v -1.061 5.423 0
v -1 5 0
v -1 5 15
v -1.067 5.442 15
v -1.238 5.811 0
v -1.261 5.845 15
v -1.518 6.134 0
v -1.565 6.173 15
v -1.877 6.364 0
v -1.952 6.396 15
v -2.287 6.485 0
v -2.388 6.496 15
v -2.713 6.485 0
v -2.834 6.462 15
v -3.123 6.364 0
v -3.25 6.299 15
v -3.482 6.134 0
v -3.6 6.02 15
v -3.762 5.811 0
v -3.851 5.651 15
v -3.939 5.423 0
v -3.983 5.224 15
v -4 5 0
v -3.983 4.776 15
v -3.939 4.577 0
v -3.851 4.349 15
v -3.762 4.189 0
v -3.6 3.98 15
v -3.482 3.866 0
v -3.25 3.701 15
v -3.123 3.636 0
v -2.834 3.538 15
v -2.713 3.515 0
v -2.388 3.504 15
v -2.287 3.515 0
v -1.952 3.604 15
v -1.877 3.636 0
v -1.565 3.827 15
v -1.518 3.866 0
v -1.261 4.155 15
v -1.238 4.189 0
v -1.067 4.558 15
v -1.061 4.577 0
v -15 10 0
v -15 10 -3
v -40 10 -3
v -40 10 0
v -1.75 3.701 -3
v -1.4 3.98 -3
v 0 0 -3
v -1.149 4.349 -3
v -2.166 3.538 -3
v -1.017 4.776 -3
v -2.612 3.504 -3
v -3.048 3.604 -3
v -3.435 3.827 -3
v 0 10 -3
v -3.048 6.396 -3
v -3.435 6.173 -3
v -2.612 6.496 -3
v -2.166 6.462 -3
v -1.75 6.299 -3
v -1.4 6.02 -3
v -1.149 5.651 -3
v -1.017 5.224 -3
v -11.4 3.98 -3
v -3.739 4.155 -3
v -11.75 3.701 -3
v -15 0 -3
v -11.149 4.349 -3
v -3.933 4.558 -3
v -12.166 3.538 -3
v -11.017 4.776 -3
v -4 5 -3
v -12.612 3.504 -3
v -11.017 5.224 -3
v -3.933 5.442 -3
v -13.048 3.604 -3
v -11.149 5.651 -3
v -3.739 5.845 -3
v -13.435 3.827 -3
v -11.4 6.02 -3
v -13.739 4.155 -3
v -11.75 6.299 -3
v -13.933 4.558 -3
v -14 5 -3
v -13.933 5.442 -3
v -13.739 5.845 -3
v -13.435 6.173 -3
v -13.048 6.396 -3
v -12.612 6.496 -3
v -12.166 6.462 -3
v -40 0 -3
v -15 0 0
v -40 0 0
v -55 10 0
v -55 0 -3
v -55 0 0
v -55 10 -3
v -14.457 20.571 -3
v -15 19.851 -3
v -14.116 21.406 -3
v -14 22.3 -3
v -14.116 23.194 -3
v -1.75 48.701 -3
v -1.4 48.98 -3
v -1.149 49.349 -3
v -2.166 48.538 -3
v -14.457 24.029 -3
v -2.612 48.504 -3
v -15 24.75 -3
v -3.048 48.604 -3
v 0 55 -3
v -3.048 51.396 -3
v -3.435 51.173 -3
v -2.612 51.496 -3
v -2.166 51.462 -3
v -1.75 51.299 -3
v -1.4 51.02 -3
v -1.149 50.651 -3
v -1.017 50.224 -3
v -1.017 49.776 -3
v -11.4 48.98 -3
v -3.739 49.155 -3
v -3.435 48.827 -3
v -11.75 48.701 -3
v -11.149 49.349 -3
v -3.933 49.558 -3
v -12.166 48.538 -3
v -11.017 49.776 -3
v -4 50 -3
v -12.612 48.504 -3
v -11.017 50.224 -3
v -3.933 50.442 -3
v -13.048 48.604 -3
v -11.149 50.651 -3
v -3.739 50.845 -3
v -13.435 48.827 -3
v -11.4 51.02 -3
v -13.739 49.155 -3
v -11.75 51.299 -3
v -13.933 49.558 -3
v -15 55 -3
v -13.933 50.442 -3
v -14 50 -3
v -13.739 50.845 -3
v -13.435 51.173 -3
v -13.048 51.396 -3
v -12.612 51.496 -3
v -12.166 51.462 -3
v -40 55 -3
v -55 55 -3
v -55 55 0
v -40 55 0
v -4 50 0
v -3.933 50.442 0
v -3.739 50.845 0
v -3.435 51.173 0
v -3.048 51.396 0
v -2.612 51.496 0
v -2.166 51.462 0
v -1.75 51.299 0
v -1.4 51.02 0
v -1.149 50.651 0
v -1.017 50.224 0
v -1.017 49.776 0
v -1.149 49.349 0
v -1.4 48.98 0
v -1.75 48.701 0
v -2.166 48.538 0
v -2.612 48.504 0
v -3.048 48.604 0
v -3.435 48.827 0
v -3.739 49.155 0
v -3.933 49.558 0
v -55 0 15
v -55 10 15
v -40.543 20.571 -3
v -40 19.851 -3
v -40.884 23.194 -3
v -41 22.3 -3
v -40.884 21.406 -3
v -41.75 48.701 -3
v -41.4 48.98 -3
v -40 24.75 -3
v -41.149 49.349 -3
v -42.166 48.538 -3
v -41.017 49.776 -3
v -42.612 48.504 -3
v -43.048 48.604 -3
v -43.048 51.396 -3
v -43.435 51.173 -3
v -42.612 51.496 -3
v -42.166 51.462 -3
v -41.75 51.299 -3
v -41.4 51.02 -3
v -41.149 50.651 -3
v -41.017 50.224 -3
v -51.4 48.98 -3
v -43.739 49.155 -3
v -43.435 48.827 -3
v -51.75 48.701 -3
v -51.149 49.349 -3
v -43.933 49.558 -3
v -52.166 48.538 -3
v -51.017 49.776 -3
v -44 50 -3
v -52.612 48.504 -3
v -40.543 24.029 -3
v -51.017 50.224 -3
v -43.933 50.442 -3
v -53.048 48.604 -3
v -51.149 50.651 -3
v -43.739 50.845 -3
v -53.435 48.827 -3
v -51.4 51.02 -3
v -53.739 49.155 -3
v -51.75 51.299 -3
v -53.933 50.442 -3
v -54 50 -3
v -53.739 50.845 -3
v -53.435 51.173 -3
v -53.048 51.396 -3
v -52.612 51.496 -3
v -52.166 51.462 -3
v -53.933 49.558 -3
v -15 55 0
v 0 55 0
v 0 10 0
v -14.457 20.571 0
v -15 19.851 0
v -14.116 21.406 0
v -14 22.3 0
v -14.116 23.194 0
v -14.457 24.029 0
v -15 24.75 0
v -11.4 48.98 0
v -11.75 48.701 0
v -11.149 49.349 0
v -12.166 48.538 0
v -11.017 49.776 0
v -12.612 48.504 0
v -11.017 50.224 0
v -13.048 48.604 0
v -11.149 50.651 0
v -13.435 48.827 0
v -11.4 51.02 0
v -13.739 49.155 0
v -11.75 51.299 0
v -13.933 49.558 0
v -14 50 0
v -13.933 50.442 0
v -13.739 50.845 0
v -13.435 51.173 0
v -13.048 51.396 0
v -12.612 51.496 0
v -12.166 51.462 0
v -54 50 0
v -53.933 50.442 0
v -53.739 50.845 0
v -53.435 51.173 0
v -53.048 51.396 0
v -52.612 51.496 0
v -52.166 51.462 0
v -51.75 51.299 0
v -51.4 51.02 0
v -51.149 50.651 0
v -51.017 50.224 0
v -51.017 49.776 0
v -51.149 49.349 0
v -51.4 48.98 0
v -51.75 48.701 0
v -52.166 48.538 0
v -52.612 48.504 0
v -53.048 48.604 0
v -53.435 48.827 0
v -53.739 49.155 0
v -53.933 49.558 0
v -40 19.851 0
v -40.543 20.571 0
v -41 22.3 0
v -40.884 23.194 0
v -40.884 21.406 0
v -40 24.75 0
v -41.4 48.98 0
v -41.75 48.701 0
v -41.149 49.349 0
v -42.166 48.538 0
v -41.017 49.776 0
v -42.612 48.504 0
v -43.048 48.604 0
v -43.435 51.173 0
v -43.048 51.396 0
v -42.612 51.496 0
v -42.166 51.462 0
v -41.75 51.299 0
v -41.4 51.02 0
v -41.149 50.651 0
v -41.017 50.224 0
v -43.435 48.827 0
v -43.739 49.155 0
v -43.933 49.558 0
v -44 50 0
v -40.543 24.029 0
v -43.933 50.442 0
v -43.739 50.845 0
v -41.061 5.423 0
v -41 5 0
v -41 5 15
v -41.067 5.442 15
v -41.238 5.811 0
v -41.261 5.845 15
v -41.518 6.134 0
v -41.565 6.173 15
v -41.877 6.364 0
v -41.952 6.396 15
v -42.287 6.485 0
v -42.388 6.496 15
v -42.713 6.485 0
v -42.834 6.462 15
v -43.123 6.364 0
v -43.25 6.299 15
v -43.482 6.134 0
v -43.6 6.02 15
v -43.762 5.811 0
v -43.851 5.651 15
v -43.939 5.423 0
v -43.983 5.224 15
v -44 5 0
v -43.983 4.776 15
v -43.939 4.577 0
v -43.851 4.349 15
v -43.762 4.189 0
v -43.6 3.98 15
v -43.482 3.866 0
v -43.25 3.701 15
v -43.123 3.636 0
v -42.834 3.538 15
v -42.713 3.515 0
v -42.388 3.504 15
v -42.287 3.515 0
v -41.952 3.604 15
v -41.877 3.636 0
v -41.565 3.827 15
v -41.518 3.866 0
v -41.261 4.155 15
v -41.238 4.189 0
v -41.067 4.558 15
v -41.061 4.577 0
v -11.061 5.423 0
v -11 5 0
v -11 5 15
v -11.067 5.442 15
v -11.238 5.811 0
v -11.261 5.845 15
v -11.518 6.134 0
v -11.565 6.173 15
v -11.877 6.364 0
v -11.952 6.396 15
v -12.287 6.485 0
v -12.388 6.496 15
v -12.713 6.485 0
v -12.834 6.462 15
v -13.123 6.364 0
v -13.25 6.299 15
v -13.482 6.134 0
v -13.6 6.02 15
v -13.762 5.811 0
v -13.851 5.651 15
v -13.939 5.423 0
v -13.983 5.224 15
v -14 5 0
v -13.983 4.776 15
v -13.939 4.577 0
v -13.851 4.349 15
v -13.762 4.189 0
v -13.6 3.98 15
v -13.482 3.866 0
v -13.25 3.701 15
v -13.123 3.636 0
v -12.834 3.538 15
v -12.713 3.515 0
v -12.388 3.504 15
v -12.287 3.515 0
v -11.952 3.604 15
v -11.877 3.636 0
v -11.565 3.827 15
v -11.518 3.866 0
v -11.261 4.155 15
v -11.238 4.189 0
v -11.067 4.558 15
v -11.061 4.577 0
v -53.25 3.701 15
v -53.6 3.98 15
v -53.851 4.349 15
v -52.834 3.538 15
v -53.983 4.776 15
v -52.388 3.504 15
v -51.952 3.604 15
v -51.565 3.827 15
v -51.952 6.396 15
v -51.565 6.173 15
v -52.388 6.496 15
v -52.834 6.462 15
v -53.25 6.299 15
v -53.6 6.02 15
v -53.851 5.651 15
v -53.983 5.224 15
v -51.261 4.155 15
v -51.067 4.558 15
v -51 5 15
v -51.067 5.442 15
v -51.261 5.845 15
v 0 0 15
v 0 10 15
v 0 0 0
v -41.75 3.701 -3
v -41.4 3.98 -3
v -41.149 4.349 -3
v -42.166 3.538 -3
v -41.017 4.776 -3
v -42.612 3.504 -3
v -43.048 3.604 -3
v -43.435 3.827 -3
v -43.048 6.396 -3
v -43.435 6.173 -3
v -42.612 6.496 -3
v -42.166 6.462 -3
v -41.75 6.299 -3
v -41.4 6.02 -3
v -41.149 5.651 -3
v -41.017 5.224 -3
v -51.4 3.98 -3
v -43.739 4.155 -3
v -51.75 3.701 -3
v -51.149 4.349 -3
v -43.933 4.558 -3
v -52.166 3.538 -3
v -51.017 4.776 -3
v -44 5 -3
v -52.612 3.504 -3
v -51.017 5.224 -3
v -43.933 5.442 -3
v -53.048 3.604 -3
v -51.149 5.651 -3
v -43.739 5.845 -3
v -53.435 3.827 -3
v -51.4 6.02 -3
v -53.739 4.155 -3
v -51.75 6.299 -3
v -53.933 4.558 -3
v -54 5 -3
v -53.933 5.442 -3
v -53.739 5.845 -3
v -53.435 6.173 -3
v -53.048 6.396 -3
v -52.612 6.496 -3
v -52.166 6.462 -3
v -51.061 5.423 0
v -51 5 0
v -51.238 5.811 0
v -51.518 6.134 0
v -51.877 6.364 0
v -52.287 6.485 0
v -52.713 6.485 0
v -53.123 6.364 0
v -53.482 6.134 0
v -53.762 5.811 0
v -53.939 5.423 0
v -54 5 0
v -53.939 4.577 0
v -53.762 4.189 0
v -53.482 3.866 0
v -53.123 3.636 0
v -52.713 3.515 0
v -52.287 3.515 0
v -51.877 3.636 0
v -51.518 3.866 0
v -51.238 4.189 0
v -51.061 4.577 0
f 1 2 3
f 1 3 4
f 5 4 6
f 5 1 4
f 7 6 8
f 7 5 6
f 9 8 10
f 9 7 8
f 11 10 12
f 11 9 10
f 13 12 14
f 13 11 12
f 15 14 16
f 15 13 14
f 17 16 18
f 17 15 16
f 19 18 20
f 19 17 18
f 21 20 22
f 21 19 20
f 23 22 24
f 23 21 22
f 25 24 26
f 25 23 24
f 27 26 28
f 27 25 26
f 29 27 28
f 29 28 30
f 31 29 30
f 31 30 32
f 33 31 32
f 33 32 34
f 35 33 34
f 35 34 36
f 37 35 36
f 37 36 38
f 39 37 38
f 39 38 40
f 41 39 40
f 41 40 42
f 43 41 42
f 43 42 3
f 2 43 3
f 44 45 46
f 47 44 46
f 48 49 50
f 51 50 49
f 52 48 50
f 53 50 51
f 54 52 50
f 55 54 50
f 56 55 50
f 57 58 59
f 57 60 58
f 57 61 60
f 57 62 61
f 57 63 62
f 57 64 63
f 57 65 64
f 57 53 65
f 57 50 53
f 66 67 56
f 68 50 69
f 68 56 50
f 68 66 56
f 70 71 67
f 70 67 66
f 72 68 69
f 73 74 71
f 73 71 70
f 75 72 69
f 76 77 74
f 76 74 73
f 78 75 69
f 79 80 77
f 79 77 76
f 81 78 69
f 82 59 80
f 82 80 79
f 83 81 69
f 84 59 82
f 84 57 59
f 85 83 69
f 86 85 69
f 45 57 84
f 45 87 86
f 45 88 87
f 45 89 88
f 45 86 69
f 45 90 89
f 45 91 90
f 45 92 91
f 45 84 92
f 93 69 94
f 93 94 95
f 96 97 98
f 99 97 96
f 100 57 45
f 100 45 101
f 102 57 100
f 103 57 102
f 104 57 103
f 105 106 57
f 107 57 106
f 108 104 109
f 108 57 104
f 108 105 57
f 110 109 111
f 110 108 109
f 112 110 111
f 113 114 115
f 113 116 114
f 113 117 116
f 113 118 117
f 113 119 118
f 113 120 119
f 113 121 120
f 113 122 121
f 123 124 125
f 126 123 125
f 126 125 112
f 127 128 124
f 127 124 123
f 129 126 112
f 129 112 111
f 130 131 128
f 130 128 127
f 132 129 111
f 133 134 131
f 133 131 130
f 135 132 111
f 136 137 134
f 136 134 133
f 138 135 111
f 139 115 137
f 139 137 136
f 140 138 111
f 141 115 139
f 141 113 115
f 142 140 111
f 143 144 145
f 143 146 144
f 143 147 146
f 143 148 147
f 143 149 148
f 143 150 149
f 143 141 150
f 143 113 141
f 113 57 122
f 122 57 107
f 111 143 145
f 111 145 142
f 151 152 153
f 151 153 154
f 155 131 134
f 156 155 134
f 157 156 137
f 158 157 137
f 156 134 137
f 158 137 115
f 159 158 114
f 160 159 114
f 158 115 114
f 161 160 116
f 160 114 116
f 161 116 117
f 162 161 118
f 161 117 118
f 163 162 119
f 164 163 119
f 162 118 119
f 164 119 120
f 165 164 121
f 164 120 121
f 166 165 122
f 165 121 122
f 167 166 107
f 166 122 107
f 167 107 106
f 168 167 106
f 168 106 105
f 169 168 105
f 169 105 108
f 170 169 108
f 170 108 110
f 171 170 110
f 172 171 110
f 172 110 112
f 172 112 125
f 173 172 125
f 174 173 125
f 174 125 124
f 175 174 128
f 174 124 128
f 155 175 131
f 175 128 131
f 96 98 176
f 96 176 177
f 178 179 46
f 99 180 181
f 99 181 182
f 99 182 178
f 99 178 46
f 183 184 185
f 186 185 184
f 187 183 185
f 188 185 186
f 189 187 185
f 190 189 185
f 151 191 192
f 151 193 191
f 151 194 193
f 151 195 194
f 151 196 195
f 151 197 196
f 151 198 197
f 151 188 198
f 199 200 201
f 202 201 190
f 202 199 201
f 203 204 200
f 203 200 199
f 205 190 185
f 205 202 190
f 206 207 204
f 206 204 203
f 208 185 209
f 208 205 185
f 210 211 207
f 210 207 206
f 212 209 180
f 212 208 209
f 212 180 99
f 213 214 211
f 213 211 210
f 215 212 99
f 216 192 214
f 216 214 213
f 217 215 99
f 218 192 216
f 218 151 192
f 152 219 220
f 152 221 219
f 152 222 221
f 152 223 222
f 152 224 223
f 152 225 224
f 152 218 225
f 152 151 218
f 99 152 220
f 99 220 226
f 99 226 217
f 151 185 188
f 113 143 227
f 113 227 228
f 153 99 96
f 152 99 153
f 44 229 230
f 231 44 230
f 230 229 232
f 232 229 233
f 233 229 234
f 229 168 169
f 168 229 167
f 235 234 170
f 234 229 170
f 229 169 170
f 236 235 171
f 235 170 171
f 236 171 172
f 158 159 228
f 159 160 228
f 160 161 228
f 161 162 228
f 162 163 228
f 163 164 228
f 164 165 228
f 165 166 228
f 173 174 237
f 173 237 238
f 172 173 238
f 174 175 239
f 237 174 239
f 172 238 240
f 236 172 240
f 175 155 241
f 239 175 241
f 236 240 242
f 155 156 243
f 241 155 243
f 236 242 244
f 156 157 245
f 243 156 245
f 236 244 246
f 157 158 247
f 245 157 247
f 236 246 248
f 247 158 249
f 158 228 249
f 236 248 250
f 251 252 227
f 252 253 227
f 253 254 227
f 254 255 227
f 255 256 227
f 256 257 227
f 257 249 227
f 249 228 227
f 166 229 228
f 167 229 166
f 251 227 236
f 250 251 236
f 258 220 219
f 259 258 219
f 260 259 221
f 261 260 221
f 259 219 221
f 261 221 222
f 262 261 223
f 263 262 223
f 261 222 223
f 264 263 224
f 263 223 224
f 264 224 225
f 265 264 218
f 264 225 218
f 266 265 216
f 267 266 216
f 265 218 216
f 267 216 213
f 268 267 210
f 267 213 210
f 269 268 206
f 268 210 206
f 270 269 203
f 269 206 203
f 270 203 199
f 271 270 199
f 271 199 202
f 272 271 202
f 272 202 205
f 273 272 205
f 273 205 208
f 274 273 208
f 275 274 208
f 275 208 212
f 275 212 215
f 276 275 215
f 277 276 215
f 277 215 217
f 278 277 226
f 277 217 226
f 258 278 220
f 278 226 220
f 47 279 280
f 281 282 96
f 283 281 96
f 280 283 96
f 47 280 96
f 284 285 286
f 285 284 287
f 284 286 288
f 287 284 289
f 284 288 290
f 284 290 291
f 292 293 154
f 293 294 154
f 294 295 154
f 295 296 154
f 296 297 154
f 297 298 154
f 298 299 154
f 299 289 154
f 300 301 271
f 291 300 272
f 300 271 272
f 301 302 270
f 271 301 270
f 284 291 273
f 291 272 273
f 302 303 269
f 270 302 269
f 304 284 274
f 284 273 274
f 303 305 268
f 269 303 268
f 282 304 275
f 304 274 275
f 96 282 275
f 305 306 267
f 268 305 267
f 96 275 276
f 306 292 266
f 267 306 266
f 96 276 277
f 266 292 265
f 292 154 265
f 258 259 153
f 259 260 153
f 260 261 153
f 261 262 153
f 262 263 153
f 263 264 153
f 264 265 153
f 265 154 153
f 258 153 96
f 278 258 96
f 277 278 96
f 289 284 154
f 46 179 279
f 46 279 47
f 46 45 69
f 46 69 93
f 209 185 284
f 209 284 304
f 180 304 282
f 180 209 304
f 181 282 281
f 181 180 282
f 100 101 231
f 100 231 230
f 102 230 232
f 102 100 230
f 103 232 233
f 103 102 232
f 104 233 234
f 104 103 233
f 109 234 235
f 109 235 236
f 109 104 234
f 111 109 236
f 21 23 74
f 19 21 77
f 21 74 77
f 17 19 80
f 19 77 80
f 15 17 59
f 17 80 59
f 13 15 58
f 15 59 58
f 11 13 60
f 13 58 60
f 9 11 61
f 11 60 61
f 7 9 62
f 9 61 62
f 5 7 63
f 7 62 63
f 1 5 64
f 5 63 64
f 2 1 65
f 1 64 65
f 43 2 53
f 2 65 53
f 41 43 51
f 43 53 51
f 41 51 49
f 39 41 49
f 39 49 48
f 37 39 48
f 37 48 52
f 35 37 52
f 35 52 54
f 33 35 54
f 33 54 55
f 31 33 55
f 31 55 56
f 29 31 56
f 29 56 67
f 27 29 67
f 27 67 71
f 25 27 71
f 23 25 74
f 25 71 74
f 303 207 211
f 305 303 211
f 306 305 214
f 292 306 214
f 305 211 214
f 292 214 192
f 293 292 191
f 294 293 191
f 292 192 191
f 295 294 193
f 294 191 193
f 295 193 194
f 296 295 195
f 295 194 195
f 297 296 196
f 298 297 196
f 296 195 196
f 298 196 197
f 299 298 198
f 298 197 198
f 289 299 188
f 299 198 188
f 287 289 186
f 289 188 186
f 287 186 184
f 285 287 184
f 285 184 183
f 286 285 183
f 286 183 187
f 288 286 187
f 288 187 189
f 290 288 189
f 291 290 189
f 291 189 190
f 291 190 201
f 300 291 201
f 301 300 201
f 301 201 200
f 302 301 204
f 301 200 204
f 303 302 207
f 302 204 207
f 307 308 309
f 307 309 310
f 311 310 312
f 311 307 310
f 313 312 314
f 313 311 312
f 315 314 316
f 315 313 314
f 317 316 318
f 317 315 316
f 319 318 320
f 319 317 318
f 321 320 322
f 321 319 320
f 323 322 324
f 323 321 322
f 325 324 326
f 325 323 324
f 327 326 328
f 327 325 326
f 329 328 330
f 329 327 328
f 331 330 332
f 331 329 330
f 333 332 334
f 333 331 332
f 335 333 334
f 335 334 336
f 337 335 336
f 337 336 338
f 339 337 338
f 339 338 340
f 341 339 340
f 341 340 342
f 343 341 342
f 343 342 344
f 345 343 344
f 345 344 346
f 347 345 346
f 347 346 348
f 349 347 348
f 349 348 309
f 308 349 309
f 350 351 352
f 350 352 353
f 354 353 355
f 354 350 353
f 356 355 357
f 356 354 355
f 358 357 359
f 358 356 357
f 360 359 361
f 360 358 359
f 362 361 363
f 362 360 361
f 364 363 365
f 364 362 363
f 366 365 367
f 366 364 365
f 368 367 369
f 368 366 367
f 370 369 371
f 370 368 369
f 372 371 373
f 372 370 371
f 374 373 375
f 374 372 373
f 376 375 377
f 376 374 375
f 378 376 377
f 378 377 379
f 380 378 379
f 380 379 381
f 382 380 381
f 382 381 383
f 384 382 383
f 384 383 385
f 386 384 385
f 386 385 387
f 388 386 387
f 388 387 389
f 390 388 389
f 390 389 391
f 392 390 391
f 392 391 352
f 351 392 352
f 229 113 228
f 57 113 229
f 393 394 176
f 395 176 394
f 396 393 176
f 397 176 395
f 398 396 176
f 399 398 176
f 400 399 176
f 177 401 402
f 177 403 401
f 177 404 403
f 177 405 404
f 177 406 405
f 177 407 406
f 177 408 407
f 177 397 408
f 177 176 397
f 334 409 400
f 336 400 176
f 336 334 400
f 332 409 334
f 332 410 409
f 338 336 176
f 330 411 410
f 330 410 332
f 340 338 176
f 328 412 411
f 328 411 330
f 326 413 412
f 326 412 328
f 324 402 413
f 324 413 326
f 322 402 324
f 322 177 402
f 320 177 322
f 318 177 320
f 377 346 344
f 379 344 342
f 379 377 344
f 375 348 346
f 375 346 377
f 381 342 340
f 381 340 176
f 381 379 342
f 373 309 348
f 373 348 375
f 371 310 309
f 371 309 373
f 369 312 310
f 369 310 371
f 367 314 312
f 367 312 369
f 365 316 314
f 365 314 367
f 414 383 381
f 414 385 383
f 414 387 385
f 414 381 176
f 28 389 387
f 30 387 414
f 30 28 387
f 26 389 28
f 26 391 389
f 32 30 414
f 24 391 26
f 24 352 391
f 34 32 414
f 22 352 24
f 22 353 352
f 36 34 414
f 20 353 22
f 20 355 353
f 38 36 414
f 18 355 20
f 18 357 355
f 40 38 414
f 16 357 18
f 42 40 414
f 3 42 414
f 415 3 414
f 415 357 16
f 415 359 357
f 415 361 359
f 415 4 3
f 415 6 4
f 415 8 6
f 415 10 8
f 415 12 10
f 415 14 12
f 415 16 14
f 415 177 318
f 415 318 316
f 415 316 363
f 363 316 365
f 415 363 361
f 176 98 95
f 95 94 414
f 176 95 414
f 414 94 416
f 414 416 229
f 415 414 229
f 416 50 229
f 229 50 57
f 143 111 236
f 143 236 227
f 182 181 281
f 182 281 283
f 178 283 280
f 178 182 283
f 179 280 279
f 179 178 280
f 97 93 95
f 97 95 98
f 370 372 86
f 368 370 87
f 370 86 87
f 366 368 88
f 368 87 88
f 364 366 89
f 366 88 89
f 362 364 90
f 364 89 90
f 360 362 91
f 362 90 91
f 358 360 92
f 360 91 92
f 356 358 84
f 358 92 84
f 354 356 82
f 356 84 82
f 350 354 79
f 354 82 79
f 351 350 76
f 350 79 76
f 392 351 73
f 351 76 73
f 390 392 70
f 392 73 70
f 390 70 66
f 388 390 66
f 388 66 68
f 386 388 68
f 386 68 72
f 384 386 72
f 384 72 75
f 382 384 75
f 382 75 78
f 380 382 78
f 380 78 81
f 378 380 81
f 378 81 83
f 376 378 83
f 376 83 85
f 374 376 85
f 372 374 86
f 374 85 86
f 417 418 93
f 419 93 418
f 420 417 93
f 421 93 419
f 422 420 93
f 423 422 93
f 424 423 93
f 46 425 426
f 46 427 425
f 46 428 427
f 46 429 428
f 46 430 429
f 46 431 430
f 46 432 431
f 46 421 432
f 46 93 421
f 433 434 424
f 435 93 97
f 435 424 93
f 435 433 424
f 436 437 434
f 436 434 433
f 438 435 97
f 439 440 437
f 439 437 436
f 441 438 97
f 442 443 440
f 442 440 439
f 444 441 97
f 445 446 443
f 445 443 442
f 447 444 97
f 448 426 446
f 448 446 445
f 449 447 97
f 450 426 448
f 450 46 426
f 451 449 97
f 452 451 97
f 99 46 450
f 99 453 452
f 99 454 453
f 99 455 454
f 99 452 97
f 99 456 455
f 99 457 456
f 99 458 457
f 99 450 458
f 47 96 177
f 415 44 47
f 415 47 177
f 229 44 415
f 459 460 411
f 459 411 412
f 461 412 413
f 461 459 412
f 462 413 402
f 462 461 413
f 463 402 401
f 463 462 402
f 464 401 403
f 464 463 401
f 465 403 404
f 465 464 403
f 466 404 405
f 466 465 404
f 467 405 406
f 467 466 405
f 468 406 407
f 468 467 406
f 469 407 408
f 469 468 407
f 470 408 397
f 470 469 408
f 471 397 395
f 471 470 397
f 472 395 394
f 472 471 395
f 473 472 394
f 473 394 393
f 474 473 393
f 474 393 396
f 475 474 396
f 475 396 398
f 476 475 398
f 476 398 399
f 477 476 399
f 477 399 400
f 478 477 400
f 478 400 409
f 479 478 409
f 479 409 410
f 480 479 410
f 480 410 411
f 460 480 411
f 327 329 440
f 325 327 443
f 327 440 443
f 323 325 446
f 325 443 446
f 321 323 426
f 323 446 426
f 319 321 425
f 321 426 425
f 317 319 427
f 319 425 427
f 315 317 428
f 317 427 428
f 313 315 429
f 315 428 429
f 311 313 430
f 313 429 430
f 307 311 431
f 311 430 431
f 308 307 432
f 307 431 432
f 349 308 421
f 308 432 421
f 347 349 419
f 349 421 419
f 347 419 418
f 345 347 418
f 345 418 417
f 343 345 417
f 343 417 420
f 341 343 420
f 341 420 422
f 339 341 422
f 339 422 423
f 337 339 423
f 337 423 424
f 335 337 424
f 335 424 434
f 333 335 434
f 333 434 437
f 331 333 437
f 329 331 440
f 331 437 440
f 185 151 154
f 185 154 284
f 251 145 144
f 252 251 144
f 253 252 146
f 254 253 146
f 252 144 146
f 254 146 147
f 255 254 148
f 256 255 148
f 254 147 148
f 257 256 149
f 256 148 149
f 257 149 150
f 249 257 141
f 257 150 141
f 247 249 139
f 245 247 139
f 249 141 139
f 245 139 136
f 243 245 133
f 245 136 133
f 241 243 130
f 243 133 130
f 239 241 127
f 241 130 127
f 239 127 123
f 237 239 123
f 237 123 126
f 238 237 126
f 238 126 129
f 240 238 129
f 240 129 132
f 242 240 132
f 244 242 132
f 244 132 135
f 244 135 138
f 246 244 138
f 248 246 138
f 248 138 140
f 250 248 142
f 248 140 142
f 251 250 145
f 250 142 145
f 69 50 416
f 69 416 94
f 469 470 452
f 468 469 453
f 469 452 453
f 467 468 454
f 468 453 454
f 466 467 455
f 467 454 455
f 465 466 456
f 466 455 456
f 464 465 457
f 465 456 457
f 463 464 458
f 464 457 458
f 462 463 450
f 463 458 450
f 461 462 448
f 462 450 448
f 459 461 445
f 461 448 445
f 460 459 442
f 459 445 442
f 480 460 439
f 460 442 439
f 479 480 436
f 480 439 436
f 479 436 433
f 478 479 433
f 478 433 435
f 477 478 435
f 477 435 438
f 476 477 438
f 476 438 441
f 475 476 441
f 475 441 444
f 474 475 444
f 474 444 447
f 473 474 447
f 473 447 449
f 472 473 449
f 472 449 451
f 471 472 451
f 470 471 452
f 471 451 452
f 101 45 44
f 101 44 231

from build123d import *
from build123d.topology import SkipClean

# Parameters (mm, degrees)
SKETCH1_W           = 55
SKETCH1_H           = 10
SKETCH1_R           = 1.5
BOSS_EXTRUDE1_DEPTH = 15
BOSS_EXTRUDE2_START = 3
SKETCH2_W           = 25
SKETCH2_H           = 10
SKETCH2_R           = 1.5
SKETCH2_W_2         = 15
BOSS_EXTRUDE2_DEPTH = 3


with BuildPart() as part:
    # Sketch1 → Boss-Extrude1 (new body)
    with BuildSketch(Plane.XY):
        with Locations((-27.5, 5)):
            Rectangle(SKETCH1_W, SKETCH1_H)
        with Locations((-2.5, 5)):
            Circle(SKETCH1_R, mode=Mode.SUBTRACT)
        with Locations((-12.5, 5)):
            Circle(SKETCH1_R, mode=Mode.SUBTRACT)
        with Locations((-42.5, 5)):
            Circle(SKETCH1_R, mode=Mode.SUBTRACT)
        with Locations((-52.5, 5)):
            Circle(SKETCH1_R, mode=Mode.SUBTRACT)
    extrude(amount=BOSS_EXTRUDE1_DEPTH)

    # Sketch2 → Boss-Extrude2 (add)
    # profile 1 of 5: a face of its own
    with SkipClean():  # the faces are left unmerged after this step: merging them gives an invalid solid
        with BuildSketch(Plane(origin=(0, 0, 0), x_dir=(-1, 0, 0), z_dir=(0, 0, -1)).offset(BOSS_EXTRUDE2_START)):
            with Locations((27.5, 5)):
                Rectangle(SKETCH2_W, SKETCH2_H)
        # profile 2 of 5: a face of its own
        with BuildSketch(Plane(origin=(0, 0, 0), x_dir=(-1, 0, 0), z_dir=(0, 0, -1)).offset(BOSS_EXTRUDE2_START)):
            with BuildLine():
                Line((0, 55), (0, 10))
                Line((0, 10), (15, 10))
                Line((15, 10), (15, 19.850540474))
                ThreePointArc((15, 19.850540474), (14, 22.300030217), (15, 24.74951996))
                Line((15, 24.74951996), (15, 55))
                Line((15, 55), (0, 55))
            make_face()
            with Locations((2.5, 50)):
                Circle(SKETCH2_R, mode=Mode.SUBTRACT)
            with Locations((12.5, 50)):
                Circle(SKETCH2_R, mode=Mode.SUBTRACT)
        # profile 3 of 5: a face of its own
        with BuildSketch(Plane(origin=(0, 0, 0), x_dir=(-1, 0, 0), z_dir=(0, 0, -1)).offset(BOSS_EXTRUDE2_START)):
            with Locations((7.5, 5)):
                Rectangle(SKETCH2_W_2, SKETCH2_H)
            with Locations((2.5, 5)):
                Circle(SKETCH2_R, mode=Mode.SUBTRACT)
            with Locations((12.5, 5)):
                Circle(SKETCH2_R, mode=Mode.SUBTRACT)
        # profile 4 of 5: a face of its own
        with BuildSketch(Plane(origin=(0, 0, 0), x_dir=(-1, 0, 0), z_dir=(0, 0, -1)).offset(BOSS_EXTRUDE2_START)):
            with Locations((47.5, 5)):
                Rectangle(SKETCH2_W_2, SKETCH2_H)
            with Locations((42.5, 5)):
                Circle(SKETCH2_R, mode=Mode.SUBTRACT)
            with Locations((52.5, 5)):
                Circle(SKETCH2_R, mode=Mode.SUBTRACT)
        # profile 5 of 5: a face of its own
        with BuildSketch(Plane(origin=(0, 0, 0), x_dir=(-1, 0, 0), z_dir=(0, 0, -1)).offset(BOSS_EXTRUDE2_START)):
            with BuildLine():
                Line((40, 19.850540474), (40, 10))
                Line((40, 10), (55, 10))
                Line((55, 10), (55, 55))
                Line((55, 55), (40, 55))
                Line((40, 55), (40, 24.74951996))
                ThreePointArc((40, 24.74951996), (40.740370349, 23.622905872), (41, 22.300030217))
                ThreePointArc((41, 22.300030217), (40.740370349, 20.977154561), (40, 19.850540474))
            make_face()
            with Locations((42.5, 50)):
                Circle(SKETCH2_R, mode=Mode.SUBTRACT)
            with Locations((52.5, 50)):
                Circle(SKETCH2_R, mode=Mode.SUBTRACT)
        extrude(amount=-BOSS_EXTRUDE2_DEPTH)


solid = part.part
